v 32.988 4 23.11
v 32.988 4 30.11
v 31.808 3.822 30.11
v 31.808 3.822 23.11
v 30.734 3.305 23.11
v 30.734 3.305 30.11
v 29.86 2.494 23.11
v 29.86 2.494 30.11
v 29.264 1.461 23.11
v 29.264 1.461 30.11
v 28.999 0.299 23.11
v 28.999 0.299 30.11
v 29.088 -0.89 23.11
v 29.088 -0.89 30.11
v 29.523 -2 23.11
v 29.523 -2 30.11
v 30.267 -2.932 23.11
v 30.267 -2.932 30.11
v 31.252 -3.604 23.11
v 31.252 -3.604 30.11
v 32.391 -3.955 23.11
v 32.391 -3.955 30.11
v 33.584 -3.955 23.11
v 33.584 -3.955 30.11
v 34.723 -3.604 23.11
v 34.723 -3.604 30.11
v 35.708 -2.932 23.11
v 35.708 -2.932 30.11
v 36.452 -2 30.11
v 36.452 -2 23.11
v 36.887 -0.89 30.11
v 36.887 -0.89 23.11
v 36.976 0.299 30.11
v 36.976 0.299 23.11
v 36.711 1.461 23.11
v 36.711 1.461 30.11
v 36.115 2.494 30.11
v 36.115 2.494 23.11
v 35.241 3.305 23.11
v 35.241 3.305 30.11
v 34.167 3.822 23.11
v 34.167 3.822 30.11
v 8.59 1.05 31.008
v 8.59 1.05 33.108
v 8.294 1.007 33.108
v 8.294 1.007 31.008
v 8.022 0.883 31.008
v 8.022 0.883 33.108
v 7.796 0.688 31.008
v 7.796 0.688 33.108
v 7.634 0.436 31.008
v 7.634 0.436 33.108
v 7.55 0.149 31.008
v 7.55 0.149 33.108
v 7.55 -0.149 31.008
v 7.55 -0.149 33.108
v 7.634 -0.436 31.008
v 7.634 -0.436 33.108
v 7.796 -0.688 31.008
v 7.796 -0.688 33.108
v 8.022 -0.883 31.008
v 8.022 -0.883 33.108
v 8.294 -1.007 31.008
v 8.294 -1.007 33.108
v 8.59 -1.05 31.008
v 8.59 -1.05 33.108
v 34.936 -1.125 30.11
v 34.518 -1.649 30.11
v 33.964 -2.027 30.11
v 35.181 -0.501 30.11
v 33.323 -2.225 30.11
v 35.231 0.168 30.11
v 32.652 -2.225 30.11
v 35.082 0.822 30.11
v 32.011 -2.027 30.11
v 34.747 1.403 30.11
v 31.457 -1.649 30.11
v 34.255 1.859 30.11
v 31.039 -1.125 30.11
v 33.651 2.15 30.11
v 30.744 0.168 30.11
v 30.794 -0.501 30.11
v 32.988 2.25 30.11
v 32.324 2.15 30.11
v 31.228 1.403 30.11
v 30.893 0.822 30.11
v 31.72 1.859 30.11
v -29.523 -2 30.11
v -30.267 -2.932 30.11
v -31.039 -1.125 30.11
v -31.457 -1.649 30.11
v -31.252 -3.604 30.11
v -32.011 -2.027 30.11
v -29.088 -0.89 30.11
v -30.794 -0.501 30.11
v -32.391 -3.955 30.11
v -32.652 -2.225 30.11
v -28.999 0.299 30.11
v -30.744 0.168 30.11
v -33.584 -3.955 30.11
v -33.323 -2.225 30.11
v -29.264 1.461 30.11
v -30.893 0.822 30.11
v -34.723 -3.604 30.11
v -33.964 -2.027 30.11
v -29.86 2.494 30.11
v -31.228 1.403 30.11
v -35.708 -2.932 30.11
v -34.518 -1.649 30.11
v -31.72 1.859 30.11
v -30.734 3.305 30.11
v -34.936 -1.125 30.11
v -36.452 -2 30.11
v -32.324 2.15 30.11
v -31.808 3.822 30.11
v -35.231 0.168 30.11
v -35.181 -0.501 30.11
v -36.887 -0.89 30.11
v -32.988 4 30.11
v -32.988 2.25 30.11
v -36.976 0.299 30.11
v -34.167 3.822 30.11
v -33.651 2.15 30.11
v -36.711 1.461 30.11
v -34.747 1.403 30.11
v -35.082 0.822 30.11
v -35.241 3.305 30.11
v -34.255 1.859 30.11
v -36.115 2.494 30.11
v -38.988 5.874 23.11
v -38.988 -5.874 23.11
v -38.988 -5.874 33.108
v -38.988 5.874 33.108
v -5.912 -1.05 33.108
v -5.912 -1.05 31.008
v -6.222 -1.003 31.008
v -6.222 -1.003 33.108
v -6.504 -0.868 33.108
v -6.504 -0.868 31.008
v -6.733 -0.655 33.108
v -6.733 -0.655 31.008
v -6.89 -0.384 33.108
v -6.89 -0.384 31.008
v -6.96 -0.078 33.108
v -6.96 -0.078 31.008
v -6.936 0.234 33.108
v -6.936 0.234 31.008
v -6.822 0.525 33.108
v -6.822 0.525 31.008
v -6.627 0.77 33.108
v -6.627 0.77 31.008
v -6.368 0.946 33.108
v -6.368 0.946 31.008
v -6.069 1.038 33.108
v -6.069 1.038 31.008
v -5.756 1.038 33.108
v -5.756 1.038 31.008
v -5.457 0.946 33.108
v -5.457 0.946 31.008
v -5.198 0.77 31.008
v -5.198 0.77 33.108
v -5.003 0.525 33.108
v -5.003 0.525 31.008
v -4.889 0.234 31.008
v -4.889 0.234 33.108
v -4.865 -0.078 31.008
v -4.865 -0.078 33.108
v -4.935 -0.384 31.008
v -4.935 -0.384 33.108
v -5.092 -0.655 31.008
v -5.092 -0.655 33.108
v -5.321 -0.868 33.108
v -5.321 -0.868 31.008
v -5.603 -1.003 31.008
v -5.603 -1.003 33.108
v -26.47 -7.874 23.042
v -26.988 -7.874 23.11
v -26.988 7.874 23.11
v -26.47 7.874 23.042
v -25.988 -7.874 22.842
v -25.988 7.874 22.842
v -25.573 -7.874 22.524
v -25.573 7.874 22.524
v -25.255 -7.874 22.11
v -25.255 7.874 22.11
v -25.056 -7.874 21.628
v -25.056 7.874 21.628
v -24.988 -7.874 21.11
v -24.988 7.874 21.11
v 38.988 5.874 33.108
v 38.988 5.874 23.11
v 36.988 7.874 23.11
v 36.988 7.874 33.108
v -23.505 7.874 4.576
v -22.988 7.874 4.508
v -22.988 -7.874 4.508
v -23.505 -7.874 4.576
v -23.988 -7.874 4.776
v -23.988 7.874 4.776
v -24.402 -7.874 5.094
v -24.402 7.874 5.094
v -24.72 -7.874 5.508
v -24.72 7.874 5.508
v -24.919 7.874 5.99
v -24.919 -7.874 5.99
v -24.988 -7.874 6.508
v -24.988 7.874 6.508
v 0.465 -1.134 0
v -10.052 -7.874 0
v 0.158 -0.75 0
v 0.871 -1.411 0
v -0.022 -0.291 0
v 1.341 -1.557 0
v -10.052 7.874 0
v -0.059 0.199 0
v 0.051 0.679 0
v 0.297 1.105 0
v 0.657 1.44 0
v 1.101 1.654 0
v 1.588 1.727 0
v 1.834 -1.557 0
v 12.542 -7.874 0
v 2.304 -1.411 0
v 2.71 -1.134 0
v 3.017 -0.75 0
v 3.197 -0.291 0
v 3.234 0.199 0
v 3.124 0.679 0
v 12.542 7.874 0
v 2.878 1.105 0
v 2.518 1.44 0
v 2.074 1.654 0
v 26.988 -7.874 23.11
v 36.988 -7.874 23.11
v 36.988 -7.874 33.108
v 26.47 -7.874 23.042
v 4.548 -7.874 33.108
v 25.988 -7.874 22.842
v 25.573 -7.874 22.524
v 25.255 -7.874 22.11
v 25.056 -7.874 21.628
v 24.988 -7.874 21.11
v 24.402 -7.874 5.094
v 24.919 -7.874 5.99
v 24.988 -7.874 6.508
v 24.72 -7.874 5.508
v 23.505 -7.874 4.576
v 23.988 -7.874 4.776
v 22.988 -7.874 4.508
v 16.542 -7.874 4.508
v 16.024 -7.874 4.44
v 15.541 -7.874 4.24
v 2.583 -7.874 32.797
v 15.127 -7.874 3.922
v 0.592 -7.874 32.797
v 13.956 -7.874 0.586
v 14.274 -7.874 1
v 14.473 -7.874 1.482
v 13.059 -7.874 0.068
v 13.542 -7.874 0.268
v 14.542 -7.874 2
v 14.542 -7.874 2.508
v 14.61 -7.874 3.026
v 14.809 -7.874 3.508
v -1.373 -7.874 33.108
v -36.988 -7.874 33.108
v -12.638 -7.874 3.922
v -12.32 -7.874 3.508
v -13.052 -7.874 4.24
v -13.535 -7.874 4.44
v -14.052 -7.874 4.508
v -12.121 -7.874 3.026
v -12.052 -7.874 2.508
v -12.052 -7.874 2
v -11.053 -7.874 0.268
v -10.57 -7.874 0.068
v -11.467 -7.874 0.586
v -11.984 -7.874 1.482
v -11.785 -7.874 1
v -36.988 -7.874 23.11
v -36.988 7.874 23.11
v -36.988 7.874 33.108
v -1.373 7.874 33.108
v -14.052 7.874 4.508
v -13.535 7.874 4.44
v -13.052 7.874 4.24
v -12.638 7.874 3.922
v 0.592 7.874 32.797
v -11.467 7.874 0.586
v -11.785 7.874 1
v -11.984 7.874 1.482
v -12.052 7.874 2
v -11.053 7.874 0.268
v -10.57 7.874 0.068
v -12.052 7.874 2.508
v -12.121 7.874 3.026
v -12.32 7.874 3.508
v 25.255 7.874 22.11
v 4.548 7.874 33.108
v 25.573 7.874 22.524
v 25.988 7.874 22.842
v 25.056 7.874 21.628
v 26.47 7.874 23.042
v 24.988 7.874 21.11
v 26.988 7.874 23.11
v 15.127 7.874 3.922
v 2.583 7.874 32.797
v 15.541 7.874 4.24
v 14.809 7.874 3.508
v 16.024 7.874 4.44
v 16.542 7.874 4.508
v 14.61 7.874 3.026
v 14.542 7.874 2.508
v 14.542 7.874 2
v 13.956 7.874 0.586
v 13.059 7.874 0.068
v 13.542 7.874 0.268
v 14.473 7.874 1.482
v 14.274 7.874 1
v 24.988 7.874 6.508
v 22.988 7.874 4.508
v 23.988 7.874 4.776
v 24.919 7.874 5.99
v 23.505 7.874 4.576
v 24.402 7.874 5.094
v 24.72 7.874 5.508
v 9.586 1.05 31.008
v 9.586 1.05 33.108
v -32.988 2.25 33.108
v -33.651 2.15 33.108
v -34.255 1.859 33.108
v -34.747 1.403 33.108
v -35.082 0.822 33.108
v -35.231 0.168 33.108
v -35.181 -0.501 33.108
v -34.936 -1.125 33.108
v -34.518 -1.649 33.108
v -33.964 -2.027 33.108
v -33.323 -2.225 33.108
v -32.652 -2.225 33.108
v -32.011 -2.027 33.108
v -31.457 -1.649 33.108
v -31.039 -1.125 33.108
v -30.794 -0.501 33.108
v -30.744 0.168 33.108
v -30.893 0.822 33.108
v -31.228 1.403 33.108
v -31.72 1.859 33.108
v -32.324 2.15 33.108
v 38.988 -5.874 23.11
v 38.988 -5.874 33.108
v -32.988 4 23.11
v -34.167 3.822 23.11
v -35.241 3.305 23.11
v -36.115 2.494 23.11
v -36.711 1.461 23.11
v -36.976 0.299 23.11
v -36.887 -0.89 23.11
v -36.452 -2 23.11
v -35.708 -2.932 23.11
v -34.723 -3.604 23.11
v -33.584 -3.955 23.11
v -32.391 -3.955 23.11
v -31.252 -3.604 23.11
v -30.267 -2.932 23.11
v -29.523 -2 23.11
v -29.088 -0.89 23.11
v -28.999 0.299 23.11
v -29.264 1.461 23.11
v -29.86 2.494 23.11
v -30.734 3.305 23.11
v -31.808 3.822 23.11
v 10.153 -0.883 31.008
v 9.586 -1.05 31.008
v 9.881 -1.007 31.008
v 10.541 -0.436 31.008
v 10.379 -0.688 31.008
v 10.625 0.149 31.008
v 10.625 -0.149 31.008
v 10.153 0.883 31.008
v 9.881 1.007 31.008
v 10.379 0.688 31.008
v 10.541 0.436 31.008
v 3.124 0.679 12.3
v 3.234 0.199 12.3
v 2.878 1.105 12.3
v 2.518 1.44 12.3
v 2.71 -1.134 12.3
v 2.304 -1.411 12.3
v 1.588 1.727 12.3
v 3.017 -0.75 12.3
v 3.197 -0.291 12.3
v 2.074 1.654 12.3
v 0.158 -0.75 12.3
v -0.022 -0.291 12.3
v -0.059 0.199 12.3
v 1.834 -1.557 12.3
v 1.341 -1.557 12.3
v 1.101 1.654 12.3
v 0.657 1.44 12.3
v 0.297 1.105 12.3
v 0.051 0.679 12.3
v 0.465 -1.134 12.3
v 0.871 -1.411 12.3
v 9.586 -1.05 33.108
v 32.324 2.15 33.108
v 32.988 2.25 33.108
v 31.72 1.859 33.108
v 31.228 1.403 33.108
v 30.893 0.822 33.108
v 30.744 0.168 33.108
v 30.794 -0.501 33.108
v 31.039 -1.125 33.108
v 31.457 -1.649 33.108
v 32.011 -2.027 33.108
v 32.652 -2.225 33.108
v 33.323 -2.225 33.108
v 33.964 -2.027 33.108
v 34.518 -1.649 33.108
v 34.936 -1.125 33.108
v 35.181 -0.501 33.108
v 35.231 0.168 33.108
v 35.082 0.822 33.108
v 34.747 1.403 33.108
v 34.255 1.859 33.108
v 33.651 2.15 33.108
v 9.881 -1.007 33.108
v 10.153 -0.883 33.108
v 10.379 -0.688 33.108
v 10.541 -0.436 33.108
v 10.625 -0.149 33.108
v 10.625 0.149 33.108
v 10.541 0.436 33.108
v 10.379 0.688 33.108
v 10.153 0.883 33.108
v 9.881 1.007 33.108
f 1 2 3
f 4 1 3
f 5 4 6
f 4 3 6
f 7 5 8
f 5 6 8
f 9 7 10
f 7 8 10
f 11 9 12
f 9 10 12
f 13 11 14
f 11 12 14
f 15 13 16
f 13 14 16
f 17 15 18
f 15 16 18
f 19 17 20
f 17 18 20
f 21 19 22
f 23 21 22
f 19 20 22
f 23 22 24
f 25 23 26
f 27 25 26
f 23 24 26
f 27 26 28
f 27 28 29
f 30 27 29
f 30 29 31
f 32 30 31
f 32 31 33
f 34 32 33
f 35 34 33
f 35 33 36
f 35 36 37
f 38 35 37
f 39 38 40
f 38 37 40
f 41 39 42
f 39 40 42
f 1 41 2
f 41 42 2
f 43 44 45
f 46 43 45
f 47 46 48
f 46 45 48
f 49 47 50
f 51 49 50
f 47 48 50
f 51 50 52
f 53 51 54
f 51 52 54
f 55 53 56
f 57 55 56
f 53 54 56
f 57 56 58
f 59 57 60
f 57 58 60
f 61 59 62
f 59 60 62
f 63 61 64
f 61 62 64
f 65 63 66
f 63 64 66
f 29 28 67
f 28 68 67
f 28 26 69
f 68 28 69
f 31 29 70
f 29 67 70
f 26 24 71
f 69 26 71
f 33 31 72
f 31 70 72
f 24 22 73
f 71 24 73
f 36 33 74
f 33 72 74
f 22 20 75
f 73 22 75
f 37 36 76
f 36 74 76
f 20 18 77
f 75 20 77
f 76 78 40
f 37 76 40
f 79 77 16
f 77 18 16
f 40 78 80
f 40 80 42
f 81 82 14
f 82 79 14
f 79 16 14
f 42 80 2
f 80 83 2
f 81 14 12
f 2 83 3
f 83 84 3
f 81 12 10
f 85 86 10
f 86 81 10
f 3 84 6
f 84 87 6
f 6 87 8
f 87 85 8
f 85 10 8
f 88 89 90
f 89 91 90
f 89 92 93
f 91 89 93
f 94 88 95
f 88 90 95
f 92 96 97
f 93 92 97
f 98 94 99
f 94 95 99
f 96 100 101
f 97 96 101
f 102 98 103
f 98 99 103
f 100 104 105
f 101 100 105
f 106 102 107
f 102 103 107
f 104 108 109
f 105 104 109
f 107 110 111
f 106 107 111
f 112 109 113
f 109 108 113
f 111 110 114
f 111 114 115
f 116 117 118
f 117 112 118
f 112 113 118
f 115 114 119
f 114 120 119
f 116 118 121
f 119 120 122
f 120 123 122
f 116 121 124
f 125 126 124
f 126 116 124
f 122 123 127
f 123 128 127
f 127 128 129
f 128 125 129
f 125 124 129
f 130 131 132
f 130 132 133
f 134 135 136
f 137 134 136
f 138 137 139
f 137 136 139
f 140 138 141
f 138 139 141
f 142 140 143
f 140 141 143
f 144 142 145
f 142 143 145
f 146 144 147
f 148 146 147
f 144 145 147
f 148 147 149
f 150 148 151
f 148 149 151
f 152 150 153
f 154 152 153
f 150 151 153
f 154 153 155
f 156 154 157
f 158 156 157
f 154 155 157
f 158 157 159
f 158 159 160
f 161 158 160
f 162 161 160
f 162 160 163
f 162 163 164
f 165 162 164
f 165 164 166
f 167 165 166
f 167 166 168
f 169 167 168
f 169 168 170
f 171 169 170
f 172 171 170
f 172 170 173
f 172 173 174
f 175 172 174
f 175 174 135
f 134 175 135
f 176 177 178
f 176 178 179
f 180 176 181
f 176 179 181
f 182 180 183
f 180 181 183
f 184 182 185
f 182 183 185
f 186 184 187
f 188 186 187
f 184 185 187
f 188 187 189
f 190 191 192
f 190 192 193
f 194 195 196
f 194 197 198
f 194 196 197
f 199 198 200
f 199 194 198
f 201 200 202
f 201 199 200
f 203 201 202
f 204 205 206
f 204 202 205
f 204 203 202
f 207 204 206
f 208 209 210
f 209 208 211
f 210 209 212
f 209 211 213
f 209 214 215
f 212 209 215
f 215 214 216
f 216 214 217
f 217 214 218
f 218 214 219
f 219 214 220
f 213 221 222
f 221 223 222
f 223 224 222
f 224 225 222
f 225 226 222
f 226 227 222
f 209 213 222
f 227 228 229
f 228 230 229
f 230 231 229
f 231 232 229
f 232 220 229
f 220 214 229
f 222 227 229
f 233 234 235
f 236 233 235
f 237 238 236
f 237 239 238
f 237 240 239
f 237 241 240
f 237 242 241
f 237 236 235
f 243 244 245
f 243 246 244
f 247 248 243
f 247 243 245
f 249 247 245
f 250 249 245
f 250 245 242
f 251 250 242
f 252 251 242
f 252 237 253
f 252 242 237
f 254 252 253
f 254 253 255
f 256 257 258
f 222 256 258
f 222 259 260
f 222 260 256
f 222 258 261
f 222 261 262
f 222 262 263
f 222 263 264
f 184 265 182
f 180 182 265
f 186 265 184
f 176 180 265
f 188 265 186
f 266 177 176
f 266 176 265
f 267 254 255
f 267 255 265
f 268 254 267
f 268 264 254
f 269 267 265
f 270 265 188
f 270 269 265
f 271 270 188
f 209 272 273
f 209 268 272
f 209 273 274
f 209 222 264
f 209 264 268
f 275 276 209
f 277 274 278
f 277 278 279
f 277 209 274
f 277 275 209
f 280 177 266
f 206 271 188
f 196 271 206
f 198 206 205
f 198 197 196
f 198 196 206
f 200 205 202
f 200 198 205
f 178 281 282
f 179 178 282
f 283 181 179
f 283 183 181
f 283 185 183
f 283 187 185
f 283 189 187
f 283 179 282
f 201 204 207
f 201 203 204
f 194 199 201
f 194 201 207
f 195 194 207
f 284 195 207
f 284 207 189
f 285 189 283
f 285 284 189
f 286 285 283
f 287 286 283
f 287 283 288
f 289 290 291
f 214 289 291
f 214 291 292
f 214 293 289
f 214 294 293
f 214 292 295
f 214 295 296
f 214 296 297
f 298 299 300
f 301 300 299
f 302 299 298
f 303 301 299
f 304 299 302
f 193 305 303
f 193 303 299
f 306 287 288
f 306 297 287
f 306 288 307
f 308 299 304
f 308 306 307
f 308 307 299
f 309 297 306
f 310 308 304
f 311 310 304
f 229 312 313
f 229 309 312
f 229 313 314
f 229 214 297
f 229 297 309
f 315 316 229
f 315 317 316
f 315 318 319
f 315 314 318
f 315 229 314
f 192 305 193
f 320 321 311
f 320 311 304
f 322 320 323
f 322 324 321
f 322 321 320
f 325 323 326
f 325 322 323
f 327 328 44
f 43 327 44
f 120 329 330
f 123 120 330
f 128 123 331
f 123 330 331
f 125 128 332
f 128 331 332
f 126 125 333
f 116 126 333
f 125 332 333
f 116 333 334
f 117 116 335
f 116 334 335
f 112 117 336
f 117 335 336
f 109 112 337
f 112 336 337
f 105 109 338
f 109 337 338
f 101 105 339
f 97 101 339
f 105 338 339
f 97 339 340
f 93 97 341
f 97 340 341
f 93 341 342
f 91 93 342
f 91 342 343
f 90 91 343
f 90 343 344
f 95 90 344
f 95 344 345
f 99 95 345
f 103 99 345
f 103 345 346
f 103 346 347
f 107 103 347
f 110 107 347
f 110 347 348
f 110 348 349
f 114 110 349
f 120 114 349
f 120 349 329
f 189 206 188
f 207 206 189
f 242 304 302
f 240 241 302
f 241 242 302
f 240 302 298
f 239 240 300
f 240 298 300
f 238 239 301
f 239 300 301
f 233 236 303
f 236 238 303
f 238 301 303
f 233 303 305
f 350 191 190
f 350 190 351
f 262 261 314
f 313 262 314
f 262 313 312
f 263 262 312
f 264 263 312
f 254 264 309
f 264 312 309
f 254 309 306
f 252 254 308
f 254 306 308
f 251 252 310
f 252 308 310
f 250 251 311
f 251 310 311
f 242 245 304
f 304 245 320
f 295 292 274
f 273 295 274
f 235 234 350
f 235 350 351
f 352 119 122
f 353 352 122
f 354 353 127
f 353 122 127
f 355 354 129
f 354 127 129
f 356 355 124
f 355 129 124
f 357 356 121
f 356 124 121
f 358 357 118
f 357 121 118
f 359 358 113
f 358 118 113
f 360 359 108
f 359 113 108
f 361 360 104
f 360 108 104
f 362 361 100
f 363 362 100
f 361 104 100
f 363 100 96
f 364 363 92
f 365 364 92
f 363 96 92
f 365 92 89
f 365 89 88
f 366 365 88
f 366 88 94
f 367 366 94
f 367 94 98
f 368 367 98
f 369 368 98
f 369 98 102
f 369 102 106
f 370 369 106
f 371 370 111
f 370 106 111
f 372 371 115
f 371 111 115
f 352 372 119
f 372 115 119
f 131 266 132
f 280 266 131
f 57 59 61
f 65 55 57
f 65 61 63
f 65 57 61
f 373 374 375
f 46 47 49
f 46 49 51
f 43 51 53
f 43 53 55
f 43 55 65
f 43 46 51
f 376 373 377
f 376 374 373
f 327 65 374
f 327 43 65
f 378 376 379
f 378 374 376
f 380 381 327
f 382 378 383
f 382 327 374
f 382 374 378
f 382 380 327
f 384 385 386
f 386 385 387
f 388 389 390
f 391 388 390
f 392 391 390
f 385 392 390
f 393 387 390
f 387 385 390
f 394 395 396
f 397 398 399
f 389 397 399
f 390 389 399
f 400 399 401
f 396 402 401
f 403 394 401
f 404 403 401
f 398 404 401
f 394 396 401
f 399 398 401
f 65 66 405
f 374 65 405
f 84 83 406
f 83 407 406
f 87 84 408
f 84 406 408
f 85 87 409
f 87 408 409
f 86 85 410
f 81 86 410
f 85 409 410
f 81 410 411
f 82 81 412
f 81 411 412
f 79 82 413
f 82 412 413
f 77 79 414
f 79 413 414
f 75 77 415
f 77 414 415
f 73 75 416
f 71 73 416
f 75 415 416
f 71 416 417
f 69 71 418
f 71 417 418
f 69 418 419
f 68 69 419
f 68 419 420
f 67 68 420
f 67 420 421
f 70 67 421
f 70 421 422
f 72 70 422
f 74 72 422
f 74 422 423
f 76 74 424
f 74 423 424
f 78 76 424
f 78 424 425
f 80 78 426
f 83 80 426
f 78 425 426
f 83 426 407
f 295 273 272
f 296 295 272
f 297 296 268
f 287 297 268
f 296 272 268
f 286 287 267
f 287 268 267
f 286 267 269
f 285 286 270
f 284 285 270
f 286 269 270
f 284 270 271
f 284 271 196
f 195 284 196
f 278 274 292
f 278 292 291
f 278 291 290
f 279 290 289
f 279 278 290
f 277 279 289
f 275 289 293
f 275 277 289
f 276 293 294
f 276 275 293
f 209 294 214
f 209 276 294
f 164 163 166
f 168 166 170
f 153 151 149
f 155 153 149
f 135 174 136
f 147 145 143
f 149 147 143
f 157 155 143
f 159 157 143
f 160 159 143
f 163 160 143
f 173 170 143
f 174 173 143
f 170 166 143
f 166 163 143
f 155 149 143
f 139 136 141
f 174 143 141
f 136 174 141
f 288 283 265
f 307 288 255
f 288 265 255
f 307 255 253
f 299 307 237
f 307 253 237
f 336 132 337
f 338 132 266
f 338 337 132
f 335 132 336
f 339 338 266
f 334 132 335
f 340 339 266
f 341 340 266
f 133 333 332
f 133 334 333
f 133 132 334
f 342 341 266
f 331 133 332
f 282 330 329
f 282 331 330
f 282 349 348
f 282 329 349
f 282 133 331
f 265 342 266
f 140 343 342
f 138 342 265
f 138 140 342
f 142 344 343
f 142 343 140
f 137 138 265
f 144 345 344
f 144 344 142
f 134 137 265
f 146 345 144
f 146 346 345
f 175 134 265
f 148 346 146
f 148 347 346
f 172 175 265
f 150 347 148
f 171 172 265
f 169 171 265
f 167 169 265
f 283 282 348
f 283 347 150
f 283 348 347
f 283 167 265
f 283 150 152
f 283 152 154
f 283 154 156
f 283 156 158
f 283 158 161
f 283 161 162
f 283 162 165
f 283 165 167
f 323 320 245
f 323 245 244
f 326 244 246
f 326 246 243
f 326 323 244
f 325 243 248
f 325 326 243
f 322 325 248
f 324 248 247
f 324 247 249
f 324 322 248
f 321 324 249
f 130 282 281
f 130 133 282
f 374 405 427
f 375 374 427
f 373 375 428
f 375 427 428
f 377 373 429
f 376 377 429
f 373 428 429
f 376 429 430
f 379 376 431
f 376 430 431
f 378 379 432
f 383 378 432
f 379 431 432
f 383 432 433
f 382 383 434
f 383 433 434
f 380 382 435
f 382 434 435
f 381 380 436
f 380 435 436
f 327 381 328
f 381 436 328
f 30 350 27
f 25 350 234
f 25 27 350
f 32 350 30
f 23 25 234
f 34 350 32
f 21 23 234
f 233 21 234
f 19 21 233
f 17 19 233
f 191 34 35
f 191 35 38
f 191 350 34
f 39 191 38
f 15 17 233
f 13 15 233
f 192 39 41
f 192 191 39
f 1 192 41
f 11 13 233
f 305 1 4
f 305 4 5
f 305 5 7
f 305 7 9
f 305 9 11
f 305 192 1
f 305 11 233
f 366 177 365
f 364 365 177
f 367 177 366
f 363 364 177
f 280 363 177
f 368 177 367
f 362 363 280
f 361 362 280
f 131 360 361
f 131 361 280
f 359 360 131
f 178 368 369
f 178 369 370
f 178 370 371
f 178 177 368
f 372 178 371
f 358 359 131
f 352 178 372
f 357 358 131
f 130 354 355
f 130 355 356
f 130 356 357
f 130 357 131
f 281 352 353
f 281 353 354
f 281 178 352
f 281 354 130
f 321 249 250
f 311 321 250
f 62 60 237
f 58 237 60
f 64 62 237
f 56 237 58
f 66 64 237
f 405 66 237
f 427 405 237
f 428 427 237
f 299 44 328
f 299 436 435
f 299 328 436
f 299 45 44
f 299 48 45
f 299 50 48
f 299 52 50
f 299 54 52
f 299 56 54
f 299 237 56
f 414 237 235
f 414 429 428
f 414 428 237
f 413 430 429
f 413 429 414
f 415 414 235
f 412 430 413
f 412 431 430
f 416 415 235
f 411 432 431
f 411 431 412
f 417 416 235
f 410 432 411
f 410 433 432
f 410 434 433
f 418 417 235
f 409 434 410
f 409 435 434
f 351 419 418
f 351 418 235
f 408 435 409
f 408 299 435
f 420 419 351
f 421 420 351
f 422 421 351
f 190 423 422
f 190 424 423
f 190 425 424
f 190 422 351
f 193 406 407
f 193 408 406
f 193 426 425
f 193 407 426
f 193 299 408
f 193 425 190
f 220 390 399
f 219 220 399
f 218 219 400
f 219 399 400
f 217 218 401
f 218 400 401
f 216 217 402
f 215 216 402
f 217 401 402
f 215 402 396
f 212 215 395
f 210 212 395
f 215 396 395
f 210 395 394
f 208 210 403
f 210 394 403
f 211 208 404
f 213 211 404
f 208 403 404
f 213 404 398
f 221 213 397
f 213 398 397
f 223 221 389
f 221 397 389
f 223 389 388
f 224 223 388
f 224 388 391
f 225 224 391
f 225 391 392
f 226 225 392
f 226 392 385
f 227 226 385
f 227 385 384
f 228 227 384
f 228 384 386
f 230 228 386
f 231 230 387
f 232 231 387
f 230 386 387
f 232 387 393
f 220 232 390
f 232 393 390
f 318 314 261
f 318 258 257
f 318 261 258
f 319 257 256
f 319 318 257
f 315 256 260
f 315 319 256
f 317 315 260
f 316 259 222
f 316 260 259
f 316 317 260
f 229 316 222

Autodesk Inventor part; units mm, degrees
ref_plane "YZ Plane" through (0, 0, 0) normal (1, 0, 0) x (0, 1, 0)
ref_plane "XZ Plane" through (0, 0, 0) normal (0, 1, 0) x (-1, 0, 0)
ref_plane "XY Plane" through (0, 0, 0) normal (0, 0, 1) x (1, 0, 0)
sketch "Sketch1" plane through (0, 0, 0) normal (0, 0, 1) x (1, 0, 0)
  line L0 (-38.9875, 7.874) -> (38.9875, 7.874)
  line L1 (38.9875, 7.874) -> (38.9875, -7.874)
  line L2 (38.9875, -7.874) -> (-38.9875, -7.874)
  line L3 (-38.9875, -7.874) -> (-38.9875, 7.874)
  point P0 (0, 0)
  dimension "d2" = 77.975
  dimension "d3" = 38.9875
  dimension "d6" = 15.748
  dimension "d7" = 7.874
extrude "Extrusion1" add sketch "Sketch1" along normal blind 33.1075
sketch "Sketch2" plane through (0, 0, 0) normal (0, 0, -1) x (-1, 0, 0)
  line L0 (38.9875, 7.874) -> (38.9875, -7.874) projected
  line L1 (-38.9875, -7.874) -> (-38.9875, 7.874) projected
  line L2 (38.9875, -7.874) -> (-38.9875, -7.874) projected
  line L3 (-38.9875, 7.874) -> (38.9875, 7.874) projected
  line L4 (38.9875, -7.874) -> (26.9875, -7.874)
  line L5 (26.9875, -7.874) -> (26.9875, 7.874)
  line L6 (26.9875, 7.874) -> (38.9875, 7.874)
  line L7 (38.9875, 7.874) -> (38.9875, -7.874)
  line L8 (-38.9875, -7.874) -> (-26.9875, -7.874)
  line L9 (-26.9875, -7.874) -> (-26.9875, 7.874)
  line L10 (-26.9875, 7.874) -> (-38.9875, 7.874)
  line L11 (-38.9875, 7.874) -> (-38.9875, -7.874)
  line L12 (38.9875, -7.874) -> (-38.9875, -7.874) projected
  line L13 (12.0525, -7.874) -> (-14.5415, -7.874)
  line L14 (-14.5415, -7.874) -> (-14.5415, 7.874)
  line L15 (-14.5415, 7.874) -> (12.0525, 7.874)
  line L16 (12.0525, 7.874) -> (12.0525, -7.874)
  line L17 (26.9875, -7.874) -> (12.0525, -7.874)
  line L18 (12.0525, -7.874) -> (12.0525, 7.874)
  line L19 (12.0525, 7.874) -> (26.9875, 7.874)
  line L20 (26.9875, 7.874) -> (26.9875, -7.874)
  line L21 (-14.5415, -7.874) -> (-26.9875, -7.874)
  line L22 (-26.9875, -7.874) -> (-26.9875, 7.874)
  line L23 (-26.9875, 7.874) -> (-14.5415, 7.874)
  line L24 (-14.5415, 7.874) -> (-14.5415, -7.874)
  line L25 (26.9875, -7.874) -> (24.9875, -7.874)
  line L26 (24.9875, -7.874) -> (24.9875, 7.874)
  line L27 (24.9875, 7.874) -> (26.9875, 7.874)
  line L28 (26.9875, 7.874) -> (26.9875, -7.874)
  line L29 (-26.9875, -7.874) -> (-24.9875, -7.874)
  line L30 (-24.9875, -7.874) -> (-24.9875, 7.874)
  line L31 (-24.9875, 7.874) -> (-26.9875, 7.874)
  line L32 (-26.9875, 7.874) -> (-26.9875, -7.874)
  point P0 (0, 0)
  point P1 (38.9875, 0)
  point P2 (-38.9875, 0)
  point P3 (-1.5875, 0)
  point P4 (32.9875, 0)
  point P5 (-32.9875, 0)
  point P6 (-14.5415, -7.874)
  point P7 (-24.9875, 7.874)
  point P8 (24.9875, 7.874)
  dimension "d4" = 0
  dimension "d5" = 0
  dimension "d8" = 12
  dimension "d9" = 12
  dimension "d14" = 6
  dimension "d15" = 15.748
  dimension "d16" = 7.874
  dimension "d17" = 6
  dimension "d18" = 7.874
  dimension "d19" = 12.954
  dimension "d20" = 13.64
  dimension "d72" = 25.4
  dimension "d74" = 7.874
  dimension "d83" = 2
  dimension "d84" = 2
hole "Hole1" at (-32.9875, 0, 0) at (32.9875, 0, 0) direction (0, 0, 1) diameter 4.5 end through all counterbore diameter 8 counterbore depth 30.11 clearance for "Socket Head Cap Screw" size "#8" standard "Ansi Unified Screw Threads"
sketch "Sketch4" plane through (0, 0, 33.1075) normal (0, 0, 1) x (1, 0, 0)
  line L0 (38.9875, 7.874) -> (38.9875, -7.874)
  line L1 (-38.9875, -7.874) -> (-38.9875, 7.874)
  line L2 (38.9875, -7.874) -> (-38.9875, -7.874)
  line L3 (-38.9875, 7.874) -> (38.9875, 7.874)
  line L4 (38.9875, -7.874) -> (26.9875, -7.874)
  line L5 (26.9875, -7.874) -> (26.9875, 7.874)
  line L6 (26.9875, 7.874) -> (38.9875, 7.874)
  line L7 (38.9875, 7.874) -> (38.9875, -7.874)
  line L8 (-38.9875, -7.874) -> (-26.9875, -7.874)
  line L9 (-26.9875, -7.874) -> (-26.9875, 7.874)
  line L10 (-26.9875, 7.874) -> (-38.9875, 7.874)
  line L11 (-38.9875, 7.874) -> (-38.9875, -7.874)
  line L12 (38.9875, -7.874) -> (-38.9875, -7.874)
  line L13 (14.5415, -7.874) -> (-12.0525, -7.874)
  line L14 (-12.0525, -7.874) -> (-12.0525, 7.874)
  line L15 (-12.0525, 7.874) -> (14.5415, 7.874)
  line L16 (14.5415, 7.874) -> (14.5415, -7.874)
  line L17 (26.9875, -7.874) -> (14.5415, -7.874)
  line L18 (14.5415, -7.874) -> (14.5415, 7.874)
  line L19 (14.5415, 7.874) -> (26.9875, 7.874)
  line L20 (26.9875, 7.874) -> (26.9875, -7.874)
  line L21 (-12.0525, -7.874) -> (-26.9875, -7.874)
  line L22 (-26.9875, -7.874) -> (-26.9875, 7.874)
  line L23 (-26.9875, 7.874) -> (-12.0525, 7.874)
  line L24 (-12.0525, 7.874) -> (-12.0525, -7.874)
  point P0 (0, 0)
  point P1 (0, 0)
  point P2 (0, 0)
  point P3 (38.9875, 0)
  point P4 (-38.9875, 0)
  point P5 (1.5875, 0.076)
  point P6 (32.9875, 0)
  point P7 (-32.9875, 0)
  dimension "d48" = 0
  dimension "d49" = 0
  dimension "d50" = 12
  dimension "d51" = 12
  dimension "d54" = 6
  dimension "d55" = 15.748
  dimension "d56" = 7.874
  dimension "d57" = 6
  dimension "d58" = 7.874
  dimension "d59" = 13.64
  dimension "d60" = 12.954
  dimension "d61" = 25.4
  dimension "d75" = 7.95
hole "Hole3" [suppressed]
extrude "Extrusion2" cut sketch "Sketch2" against normal blind 4.508 contours L5 L2 L26 L3 | L26 L2 L16 L3 | L14 L2 L30 L3 | L30 L2 L9 L3
fillet "Fillet1" radius 2 2 edges at (-12.0525, 0, 0) (14.5415, 0, 0)
fillet "Fillet2" radius 2 2 edges at (-12.0525, 0, 4.508) (14.5415, 0, 4.508)
extrude "Extrusion3" cut sketch "Sketch2" against normal blind 23.11 contours L0 L2 L5 L3 | L5 L2 L26 L3 | L30 L2 L9 L3 | L9 L2 L1 L3
chamfer "Chamfer1" distance 2 angle 45 4 edges at (-38.9875, 7.874, 28.1088) (-38.9875, -7.874, 28.1088) (38.9875, 7.874, 28.1088) (38.9875, -7.874, 28.1088)
fillet "Fillet4" radius 2 4 edges at (-24.9875, 0, 4.508) (-24.9875, 0, 23.11) (24.9875, 0, 4.508) (24.9875, 0, 23.11)
sketch "Sketch5" plane through (-10.0525, -7.874, 0) normal (0, -1, 0) x (1, 0, 0)
  line L0 (13.89, 2.9975) -> (9.39, 2.9975) projected
  line L1 (-26.935, 33.1075) -> (47.04, 33.1075) projected
  circle A0 centre (11.64, 45.4575) radius 12.7
  point P0 (10.0525, 0)
  point P1 (11.64, 2.9975)
  point P2 (11.64, 33.1075)
  point P3 (14.601, 33.1075)
  point P4 (8.679, 33.1075)
  dimension "d86" = 25.4
  dimension "d87" = 12.35
extrude "Extrusion4" cut sketch "Sketch5" against normal through all contours L1 A0 picked at (11.9717, 33.0038)
sketch "Sketch6" plane through (0, 0, 33.1075) normal (0, 0, 1) x (1, 0, 0)
  line L0 (9.5855, 0) -> (8.5895, 0) construction
  line L1 (9.5855, 1.05) -> (8.5895, 1.05)
  line L2 (8.5895, -1.05) -> (9.5855, -1.05)
  arc A0 (9.5855, -1.05) -> (9.5855, 1.05) centre (9.5855, 0) ccw
  arc A1 (8.5895, 1.05) -> (8.5895, -1.05) centre (8.5895, 0) ccw
  line L3 (-12.0525, 7.874) -> (-12.0525, -7.874) projected
  line L4 (4.5485, -7.874) -> (-1.3735, -7.874) projected
  point P0 (0, 0)
  point P1 (1.5875, -5.5)
  point P2 (1.5875, 0)
  point P3 (-5.9125, 0)
  point P4 (9.0875, 0)
  dimension "d90" = 0
  dimension "d91" = 5.5
  dimension "d92" = 0
  dimension "d93" = 7.5
  dimension "d94" = 0
  dimension "d95" = 7.5
  dimension "d96" = 1.05
  dimension "d97" = 0.996
  dimension "d98" = 13.64
  dimension "d99" = 7.874
hole "Hole4" at (-5.9125, 0, 33.1075) direction (0, 0, -1) diameter 2.1 depth 2.1
sketch "Sketch8" plane through (0, 0, 33.1075) normal (0, 0, 1) x (1, 0, 0)
  line L0 (9.5855, 0) -> (8.5895, 0) construction
  line L1 (9.5855, 1.05) -> (8.5895, 1.05)
  line L2 (8.5895, -1.05) -> (9.5855, -1.05)
  arc A0 (9.5855, -1.05) -> (9.5855, 1.05) centre (9.5855, 0) ccw
  arc A1 (8.5895, 1.05) -> (8.5895, -1.05) centre (8.5895, 0) ccw
  line L3 (-12.0525, 7.874) -> (-12.0525, -7.874)
  line L4 (4.5485, -7.798) -> (-1.3735, -7.798)
  line L5 (4.5485, -7.874) -> (-1.3735, -7.874) projected
  point P0 (0, 0)
  point P1 (0, 0)
  point P2 (1.5875, -5.5)
  point P3 (1.5875, 0)
  point P4 (-5.9125, 0)
  point P5 (9.0875, 0)
  dimension "d121" = 0
  dimension "d122" = 5.5
  dimension "d123" = 0
  dimension "d124" = 7.5
  dimension "d125" = 0
  dimension "d126" = 7.5
  dimension "d127" = 1.05
  dimension "d128" = 0.996
  dimension "d129" = 13.64
  dimension "d157" = 7.874
extrude "Extrusion6" cut sketch "Sketch8" against normal blind 2.1
sketch "Sketch9" plane through (0, 0, 0) normal (0, 0, -1) x (-1, 0, 0)
  line L0 (38.9875, 7.874) -> (38.9875, -7.874)
  line L1 (-38.9875, -7.874) -> (-38.9875, 7.874)
  line L2 (38.9875, -7.874) -> (-38.9875, -7.874)
  line L3 (-38.9875, 7.874) -> (38.9875, 7.874)
  line L4 (38.9875, -7.874) -> (26.9875, -7.874)
  line L5 (26.9875, -7.874) -> (26.9875, 7.874)
  line L6 (26.9875, 7.874) -> (38.9875, 7.874)
  line L7 (38.9875, 7.874) -> (38.9875, -7.874)
  line L8 (-38.9875, -7.874) -> (-26.9875, -7.874)
  line L9 (-26.9875, -7.874) -> (-26.9875, 7.874)
  line L10 (-26.9875, 7.874) -> (-38.9875, 7.874)
  line L11 (-38.9875, 7.874) -> (-38.9875, -7.874)
  line L12 (38.9875, -7.874) -> (-38.9875, -7.874)
  line L13 (12.0525, -7.874) -> (-14.5415, -7.874)
  line L14 (-14.5415, -7.874) -> (-14.5415, 7.874)
  line L15 (-14.5415, 7.874) -> (12.0525, 7.874)
  line L16 (12.0525, 7.874) -> (12.0525, -7.874)
  line L17 (26.9875, -7.874) -> (12.0525, -7.874)
  line L18 (12.0525, -7.874) -> (12.0525, 7.874)
  line L19 (12.0525, 7.874) -> (26.9875, 7.874)
  line L20 (26.9875, 7.874) -> (26.9875, -7.874)
  line L21 (-14.5415, -7.874) -> (-26.9875, -7.874)
  line L22 (-26.9875, -7.874) -> (-26.9875, 7.874)
  line L23 (-26.9875, 7.874) -> (-14.5415, 7.874)
  line L24 (-14.5415, 7.874) -> (-14.5415, -7.874)
  line L25 (26.9875, -7.874) -> (24.9875, -7.874)
  line L26 (24.9875, -7.874) -> (24.9875, 7.874)
  line L27 (24.9875, 7.874) -> (26.9875, 7.874)
  line L28 (26.9875, 7.874) -> (26.9875, -7.874)
  line L29 (-26.9875, -7.874) -> (-24.9875, -7.874)
  line L30 (-24.9875, -7.874) -> (-24.9875, 7.874)
  line L31 (-24.9875, 7.874) -> (-26.9875, 7.874)
  line L32 (-26.9875, 7.874) -> (-26.9875, -7.874)
  point P0 (0, 0)
  point P1 (0, 0)
  point P2 (38.9875, 0)
  point P3 (-38.9875, 0)
  point P4 (-1.5875, 0.076)
  point P5 (32.9875, 0)
  point P6 (-32.9875, 0)
  point P7 (-14.5415, -7.874)
  point P8 (-24.9875, 7.874)
  point P9 (24.9875, 7.874)
  dimension "d135" = 0
  dimension "d136" = 0
  dimension "d137" = 12
  dimension "d138" = 12
  dimension "d139" = 6
  dimension "d140" = 15.748
  dimension "d141" = 7.874
  dimension "d142" = 6
  dimension "d143" = 7.874
  dimension "d144" = 12.954
  dimension "d145" = 13.64
  dimension "d146" = 25.4
  dimension "d147" = 7.95
  dimension "d148" = 2
  dimension "d149" = 2
hole "Hole5" at (1.5875, 0.076, 0) direction (0, 0, 1) diameter 3.302 depth 12.3 thread size "8-32 UNC" class "2B" standard "ANSI Unified Screw Threads"
equation "\"d3\" = 0.5 * d2"
equation "\"d7\" = 0.5 * d6"
equation "\"d14\" = 0.5 * d8"
equation "\"d17\" = d14"
equation "\"d18\" = d16"
equation "\"d74\" = d18"
equation "\"d54\" = 0.5 * d50"
equation "\"d56\" = 0.5 * d55"
equation "\"d57\" = d54"
equation "\"d58\" = d56"
equation "\"d95\" = d93"
equation "\"d98\" = d59"
equation "\"d99\" = d16"
equation "\"d126\" = d124"
equation "\"d129\" = d131"
equation "\"d157\" = d16"
equation "\"d139\" = 0.5 * d137"
equation "\"d141\" = 0.5 * d140"
equation "\"d142\" = d139"
equation "\"d143\" = d141"
equation "\"d131\" = 13.64"
properties part number "ADAPTER_new-focus-8821"
